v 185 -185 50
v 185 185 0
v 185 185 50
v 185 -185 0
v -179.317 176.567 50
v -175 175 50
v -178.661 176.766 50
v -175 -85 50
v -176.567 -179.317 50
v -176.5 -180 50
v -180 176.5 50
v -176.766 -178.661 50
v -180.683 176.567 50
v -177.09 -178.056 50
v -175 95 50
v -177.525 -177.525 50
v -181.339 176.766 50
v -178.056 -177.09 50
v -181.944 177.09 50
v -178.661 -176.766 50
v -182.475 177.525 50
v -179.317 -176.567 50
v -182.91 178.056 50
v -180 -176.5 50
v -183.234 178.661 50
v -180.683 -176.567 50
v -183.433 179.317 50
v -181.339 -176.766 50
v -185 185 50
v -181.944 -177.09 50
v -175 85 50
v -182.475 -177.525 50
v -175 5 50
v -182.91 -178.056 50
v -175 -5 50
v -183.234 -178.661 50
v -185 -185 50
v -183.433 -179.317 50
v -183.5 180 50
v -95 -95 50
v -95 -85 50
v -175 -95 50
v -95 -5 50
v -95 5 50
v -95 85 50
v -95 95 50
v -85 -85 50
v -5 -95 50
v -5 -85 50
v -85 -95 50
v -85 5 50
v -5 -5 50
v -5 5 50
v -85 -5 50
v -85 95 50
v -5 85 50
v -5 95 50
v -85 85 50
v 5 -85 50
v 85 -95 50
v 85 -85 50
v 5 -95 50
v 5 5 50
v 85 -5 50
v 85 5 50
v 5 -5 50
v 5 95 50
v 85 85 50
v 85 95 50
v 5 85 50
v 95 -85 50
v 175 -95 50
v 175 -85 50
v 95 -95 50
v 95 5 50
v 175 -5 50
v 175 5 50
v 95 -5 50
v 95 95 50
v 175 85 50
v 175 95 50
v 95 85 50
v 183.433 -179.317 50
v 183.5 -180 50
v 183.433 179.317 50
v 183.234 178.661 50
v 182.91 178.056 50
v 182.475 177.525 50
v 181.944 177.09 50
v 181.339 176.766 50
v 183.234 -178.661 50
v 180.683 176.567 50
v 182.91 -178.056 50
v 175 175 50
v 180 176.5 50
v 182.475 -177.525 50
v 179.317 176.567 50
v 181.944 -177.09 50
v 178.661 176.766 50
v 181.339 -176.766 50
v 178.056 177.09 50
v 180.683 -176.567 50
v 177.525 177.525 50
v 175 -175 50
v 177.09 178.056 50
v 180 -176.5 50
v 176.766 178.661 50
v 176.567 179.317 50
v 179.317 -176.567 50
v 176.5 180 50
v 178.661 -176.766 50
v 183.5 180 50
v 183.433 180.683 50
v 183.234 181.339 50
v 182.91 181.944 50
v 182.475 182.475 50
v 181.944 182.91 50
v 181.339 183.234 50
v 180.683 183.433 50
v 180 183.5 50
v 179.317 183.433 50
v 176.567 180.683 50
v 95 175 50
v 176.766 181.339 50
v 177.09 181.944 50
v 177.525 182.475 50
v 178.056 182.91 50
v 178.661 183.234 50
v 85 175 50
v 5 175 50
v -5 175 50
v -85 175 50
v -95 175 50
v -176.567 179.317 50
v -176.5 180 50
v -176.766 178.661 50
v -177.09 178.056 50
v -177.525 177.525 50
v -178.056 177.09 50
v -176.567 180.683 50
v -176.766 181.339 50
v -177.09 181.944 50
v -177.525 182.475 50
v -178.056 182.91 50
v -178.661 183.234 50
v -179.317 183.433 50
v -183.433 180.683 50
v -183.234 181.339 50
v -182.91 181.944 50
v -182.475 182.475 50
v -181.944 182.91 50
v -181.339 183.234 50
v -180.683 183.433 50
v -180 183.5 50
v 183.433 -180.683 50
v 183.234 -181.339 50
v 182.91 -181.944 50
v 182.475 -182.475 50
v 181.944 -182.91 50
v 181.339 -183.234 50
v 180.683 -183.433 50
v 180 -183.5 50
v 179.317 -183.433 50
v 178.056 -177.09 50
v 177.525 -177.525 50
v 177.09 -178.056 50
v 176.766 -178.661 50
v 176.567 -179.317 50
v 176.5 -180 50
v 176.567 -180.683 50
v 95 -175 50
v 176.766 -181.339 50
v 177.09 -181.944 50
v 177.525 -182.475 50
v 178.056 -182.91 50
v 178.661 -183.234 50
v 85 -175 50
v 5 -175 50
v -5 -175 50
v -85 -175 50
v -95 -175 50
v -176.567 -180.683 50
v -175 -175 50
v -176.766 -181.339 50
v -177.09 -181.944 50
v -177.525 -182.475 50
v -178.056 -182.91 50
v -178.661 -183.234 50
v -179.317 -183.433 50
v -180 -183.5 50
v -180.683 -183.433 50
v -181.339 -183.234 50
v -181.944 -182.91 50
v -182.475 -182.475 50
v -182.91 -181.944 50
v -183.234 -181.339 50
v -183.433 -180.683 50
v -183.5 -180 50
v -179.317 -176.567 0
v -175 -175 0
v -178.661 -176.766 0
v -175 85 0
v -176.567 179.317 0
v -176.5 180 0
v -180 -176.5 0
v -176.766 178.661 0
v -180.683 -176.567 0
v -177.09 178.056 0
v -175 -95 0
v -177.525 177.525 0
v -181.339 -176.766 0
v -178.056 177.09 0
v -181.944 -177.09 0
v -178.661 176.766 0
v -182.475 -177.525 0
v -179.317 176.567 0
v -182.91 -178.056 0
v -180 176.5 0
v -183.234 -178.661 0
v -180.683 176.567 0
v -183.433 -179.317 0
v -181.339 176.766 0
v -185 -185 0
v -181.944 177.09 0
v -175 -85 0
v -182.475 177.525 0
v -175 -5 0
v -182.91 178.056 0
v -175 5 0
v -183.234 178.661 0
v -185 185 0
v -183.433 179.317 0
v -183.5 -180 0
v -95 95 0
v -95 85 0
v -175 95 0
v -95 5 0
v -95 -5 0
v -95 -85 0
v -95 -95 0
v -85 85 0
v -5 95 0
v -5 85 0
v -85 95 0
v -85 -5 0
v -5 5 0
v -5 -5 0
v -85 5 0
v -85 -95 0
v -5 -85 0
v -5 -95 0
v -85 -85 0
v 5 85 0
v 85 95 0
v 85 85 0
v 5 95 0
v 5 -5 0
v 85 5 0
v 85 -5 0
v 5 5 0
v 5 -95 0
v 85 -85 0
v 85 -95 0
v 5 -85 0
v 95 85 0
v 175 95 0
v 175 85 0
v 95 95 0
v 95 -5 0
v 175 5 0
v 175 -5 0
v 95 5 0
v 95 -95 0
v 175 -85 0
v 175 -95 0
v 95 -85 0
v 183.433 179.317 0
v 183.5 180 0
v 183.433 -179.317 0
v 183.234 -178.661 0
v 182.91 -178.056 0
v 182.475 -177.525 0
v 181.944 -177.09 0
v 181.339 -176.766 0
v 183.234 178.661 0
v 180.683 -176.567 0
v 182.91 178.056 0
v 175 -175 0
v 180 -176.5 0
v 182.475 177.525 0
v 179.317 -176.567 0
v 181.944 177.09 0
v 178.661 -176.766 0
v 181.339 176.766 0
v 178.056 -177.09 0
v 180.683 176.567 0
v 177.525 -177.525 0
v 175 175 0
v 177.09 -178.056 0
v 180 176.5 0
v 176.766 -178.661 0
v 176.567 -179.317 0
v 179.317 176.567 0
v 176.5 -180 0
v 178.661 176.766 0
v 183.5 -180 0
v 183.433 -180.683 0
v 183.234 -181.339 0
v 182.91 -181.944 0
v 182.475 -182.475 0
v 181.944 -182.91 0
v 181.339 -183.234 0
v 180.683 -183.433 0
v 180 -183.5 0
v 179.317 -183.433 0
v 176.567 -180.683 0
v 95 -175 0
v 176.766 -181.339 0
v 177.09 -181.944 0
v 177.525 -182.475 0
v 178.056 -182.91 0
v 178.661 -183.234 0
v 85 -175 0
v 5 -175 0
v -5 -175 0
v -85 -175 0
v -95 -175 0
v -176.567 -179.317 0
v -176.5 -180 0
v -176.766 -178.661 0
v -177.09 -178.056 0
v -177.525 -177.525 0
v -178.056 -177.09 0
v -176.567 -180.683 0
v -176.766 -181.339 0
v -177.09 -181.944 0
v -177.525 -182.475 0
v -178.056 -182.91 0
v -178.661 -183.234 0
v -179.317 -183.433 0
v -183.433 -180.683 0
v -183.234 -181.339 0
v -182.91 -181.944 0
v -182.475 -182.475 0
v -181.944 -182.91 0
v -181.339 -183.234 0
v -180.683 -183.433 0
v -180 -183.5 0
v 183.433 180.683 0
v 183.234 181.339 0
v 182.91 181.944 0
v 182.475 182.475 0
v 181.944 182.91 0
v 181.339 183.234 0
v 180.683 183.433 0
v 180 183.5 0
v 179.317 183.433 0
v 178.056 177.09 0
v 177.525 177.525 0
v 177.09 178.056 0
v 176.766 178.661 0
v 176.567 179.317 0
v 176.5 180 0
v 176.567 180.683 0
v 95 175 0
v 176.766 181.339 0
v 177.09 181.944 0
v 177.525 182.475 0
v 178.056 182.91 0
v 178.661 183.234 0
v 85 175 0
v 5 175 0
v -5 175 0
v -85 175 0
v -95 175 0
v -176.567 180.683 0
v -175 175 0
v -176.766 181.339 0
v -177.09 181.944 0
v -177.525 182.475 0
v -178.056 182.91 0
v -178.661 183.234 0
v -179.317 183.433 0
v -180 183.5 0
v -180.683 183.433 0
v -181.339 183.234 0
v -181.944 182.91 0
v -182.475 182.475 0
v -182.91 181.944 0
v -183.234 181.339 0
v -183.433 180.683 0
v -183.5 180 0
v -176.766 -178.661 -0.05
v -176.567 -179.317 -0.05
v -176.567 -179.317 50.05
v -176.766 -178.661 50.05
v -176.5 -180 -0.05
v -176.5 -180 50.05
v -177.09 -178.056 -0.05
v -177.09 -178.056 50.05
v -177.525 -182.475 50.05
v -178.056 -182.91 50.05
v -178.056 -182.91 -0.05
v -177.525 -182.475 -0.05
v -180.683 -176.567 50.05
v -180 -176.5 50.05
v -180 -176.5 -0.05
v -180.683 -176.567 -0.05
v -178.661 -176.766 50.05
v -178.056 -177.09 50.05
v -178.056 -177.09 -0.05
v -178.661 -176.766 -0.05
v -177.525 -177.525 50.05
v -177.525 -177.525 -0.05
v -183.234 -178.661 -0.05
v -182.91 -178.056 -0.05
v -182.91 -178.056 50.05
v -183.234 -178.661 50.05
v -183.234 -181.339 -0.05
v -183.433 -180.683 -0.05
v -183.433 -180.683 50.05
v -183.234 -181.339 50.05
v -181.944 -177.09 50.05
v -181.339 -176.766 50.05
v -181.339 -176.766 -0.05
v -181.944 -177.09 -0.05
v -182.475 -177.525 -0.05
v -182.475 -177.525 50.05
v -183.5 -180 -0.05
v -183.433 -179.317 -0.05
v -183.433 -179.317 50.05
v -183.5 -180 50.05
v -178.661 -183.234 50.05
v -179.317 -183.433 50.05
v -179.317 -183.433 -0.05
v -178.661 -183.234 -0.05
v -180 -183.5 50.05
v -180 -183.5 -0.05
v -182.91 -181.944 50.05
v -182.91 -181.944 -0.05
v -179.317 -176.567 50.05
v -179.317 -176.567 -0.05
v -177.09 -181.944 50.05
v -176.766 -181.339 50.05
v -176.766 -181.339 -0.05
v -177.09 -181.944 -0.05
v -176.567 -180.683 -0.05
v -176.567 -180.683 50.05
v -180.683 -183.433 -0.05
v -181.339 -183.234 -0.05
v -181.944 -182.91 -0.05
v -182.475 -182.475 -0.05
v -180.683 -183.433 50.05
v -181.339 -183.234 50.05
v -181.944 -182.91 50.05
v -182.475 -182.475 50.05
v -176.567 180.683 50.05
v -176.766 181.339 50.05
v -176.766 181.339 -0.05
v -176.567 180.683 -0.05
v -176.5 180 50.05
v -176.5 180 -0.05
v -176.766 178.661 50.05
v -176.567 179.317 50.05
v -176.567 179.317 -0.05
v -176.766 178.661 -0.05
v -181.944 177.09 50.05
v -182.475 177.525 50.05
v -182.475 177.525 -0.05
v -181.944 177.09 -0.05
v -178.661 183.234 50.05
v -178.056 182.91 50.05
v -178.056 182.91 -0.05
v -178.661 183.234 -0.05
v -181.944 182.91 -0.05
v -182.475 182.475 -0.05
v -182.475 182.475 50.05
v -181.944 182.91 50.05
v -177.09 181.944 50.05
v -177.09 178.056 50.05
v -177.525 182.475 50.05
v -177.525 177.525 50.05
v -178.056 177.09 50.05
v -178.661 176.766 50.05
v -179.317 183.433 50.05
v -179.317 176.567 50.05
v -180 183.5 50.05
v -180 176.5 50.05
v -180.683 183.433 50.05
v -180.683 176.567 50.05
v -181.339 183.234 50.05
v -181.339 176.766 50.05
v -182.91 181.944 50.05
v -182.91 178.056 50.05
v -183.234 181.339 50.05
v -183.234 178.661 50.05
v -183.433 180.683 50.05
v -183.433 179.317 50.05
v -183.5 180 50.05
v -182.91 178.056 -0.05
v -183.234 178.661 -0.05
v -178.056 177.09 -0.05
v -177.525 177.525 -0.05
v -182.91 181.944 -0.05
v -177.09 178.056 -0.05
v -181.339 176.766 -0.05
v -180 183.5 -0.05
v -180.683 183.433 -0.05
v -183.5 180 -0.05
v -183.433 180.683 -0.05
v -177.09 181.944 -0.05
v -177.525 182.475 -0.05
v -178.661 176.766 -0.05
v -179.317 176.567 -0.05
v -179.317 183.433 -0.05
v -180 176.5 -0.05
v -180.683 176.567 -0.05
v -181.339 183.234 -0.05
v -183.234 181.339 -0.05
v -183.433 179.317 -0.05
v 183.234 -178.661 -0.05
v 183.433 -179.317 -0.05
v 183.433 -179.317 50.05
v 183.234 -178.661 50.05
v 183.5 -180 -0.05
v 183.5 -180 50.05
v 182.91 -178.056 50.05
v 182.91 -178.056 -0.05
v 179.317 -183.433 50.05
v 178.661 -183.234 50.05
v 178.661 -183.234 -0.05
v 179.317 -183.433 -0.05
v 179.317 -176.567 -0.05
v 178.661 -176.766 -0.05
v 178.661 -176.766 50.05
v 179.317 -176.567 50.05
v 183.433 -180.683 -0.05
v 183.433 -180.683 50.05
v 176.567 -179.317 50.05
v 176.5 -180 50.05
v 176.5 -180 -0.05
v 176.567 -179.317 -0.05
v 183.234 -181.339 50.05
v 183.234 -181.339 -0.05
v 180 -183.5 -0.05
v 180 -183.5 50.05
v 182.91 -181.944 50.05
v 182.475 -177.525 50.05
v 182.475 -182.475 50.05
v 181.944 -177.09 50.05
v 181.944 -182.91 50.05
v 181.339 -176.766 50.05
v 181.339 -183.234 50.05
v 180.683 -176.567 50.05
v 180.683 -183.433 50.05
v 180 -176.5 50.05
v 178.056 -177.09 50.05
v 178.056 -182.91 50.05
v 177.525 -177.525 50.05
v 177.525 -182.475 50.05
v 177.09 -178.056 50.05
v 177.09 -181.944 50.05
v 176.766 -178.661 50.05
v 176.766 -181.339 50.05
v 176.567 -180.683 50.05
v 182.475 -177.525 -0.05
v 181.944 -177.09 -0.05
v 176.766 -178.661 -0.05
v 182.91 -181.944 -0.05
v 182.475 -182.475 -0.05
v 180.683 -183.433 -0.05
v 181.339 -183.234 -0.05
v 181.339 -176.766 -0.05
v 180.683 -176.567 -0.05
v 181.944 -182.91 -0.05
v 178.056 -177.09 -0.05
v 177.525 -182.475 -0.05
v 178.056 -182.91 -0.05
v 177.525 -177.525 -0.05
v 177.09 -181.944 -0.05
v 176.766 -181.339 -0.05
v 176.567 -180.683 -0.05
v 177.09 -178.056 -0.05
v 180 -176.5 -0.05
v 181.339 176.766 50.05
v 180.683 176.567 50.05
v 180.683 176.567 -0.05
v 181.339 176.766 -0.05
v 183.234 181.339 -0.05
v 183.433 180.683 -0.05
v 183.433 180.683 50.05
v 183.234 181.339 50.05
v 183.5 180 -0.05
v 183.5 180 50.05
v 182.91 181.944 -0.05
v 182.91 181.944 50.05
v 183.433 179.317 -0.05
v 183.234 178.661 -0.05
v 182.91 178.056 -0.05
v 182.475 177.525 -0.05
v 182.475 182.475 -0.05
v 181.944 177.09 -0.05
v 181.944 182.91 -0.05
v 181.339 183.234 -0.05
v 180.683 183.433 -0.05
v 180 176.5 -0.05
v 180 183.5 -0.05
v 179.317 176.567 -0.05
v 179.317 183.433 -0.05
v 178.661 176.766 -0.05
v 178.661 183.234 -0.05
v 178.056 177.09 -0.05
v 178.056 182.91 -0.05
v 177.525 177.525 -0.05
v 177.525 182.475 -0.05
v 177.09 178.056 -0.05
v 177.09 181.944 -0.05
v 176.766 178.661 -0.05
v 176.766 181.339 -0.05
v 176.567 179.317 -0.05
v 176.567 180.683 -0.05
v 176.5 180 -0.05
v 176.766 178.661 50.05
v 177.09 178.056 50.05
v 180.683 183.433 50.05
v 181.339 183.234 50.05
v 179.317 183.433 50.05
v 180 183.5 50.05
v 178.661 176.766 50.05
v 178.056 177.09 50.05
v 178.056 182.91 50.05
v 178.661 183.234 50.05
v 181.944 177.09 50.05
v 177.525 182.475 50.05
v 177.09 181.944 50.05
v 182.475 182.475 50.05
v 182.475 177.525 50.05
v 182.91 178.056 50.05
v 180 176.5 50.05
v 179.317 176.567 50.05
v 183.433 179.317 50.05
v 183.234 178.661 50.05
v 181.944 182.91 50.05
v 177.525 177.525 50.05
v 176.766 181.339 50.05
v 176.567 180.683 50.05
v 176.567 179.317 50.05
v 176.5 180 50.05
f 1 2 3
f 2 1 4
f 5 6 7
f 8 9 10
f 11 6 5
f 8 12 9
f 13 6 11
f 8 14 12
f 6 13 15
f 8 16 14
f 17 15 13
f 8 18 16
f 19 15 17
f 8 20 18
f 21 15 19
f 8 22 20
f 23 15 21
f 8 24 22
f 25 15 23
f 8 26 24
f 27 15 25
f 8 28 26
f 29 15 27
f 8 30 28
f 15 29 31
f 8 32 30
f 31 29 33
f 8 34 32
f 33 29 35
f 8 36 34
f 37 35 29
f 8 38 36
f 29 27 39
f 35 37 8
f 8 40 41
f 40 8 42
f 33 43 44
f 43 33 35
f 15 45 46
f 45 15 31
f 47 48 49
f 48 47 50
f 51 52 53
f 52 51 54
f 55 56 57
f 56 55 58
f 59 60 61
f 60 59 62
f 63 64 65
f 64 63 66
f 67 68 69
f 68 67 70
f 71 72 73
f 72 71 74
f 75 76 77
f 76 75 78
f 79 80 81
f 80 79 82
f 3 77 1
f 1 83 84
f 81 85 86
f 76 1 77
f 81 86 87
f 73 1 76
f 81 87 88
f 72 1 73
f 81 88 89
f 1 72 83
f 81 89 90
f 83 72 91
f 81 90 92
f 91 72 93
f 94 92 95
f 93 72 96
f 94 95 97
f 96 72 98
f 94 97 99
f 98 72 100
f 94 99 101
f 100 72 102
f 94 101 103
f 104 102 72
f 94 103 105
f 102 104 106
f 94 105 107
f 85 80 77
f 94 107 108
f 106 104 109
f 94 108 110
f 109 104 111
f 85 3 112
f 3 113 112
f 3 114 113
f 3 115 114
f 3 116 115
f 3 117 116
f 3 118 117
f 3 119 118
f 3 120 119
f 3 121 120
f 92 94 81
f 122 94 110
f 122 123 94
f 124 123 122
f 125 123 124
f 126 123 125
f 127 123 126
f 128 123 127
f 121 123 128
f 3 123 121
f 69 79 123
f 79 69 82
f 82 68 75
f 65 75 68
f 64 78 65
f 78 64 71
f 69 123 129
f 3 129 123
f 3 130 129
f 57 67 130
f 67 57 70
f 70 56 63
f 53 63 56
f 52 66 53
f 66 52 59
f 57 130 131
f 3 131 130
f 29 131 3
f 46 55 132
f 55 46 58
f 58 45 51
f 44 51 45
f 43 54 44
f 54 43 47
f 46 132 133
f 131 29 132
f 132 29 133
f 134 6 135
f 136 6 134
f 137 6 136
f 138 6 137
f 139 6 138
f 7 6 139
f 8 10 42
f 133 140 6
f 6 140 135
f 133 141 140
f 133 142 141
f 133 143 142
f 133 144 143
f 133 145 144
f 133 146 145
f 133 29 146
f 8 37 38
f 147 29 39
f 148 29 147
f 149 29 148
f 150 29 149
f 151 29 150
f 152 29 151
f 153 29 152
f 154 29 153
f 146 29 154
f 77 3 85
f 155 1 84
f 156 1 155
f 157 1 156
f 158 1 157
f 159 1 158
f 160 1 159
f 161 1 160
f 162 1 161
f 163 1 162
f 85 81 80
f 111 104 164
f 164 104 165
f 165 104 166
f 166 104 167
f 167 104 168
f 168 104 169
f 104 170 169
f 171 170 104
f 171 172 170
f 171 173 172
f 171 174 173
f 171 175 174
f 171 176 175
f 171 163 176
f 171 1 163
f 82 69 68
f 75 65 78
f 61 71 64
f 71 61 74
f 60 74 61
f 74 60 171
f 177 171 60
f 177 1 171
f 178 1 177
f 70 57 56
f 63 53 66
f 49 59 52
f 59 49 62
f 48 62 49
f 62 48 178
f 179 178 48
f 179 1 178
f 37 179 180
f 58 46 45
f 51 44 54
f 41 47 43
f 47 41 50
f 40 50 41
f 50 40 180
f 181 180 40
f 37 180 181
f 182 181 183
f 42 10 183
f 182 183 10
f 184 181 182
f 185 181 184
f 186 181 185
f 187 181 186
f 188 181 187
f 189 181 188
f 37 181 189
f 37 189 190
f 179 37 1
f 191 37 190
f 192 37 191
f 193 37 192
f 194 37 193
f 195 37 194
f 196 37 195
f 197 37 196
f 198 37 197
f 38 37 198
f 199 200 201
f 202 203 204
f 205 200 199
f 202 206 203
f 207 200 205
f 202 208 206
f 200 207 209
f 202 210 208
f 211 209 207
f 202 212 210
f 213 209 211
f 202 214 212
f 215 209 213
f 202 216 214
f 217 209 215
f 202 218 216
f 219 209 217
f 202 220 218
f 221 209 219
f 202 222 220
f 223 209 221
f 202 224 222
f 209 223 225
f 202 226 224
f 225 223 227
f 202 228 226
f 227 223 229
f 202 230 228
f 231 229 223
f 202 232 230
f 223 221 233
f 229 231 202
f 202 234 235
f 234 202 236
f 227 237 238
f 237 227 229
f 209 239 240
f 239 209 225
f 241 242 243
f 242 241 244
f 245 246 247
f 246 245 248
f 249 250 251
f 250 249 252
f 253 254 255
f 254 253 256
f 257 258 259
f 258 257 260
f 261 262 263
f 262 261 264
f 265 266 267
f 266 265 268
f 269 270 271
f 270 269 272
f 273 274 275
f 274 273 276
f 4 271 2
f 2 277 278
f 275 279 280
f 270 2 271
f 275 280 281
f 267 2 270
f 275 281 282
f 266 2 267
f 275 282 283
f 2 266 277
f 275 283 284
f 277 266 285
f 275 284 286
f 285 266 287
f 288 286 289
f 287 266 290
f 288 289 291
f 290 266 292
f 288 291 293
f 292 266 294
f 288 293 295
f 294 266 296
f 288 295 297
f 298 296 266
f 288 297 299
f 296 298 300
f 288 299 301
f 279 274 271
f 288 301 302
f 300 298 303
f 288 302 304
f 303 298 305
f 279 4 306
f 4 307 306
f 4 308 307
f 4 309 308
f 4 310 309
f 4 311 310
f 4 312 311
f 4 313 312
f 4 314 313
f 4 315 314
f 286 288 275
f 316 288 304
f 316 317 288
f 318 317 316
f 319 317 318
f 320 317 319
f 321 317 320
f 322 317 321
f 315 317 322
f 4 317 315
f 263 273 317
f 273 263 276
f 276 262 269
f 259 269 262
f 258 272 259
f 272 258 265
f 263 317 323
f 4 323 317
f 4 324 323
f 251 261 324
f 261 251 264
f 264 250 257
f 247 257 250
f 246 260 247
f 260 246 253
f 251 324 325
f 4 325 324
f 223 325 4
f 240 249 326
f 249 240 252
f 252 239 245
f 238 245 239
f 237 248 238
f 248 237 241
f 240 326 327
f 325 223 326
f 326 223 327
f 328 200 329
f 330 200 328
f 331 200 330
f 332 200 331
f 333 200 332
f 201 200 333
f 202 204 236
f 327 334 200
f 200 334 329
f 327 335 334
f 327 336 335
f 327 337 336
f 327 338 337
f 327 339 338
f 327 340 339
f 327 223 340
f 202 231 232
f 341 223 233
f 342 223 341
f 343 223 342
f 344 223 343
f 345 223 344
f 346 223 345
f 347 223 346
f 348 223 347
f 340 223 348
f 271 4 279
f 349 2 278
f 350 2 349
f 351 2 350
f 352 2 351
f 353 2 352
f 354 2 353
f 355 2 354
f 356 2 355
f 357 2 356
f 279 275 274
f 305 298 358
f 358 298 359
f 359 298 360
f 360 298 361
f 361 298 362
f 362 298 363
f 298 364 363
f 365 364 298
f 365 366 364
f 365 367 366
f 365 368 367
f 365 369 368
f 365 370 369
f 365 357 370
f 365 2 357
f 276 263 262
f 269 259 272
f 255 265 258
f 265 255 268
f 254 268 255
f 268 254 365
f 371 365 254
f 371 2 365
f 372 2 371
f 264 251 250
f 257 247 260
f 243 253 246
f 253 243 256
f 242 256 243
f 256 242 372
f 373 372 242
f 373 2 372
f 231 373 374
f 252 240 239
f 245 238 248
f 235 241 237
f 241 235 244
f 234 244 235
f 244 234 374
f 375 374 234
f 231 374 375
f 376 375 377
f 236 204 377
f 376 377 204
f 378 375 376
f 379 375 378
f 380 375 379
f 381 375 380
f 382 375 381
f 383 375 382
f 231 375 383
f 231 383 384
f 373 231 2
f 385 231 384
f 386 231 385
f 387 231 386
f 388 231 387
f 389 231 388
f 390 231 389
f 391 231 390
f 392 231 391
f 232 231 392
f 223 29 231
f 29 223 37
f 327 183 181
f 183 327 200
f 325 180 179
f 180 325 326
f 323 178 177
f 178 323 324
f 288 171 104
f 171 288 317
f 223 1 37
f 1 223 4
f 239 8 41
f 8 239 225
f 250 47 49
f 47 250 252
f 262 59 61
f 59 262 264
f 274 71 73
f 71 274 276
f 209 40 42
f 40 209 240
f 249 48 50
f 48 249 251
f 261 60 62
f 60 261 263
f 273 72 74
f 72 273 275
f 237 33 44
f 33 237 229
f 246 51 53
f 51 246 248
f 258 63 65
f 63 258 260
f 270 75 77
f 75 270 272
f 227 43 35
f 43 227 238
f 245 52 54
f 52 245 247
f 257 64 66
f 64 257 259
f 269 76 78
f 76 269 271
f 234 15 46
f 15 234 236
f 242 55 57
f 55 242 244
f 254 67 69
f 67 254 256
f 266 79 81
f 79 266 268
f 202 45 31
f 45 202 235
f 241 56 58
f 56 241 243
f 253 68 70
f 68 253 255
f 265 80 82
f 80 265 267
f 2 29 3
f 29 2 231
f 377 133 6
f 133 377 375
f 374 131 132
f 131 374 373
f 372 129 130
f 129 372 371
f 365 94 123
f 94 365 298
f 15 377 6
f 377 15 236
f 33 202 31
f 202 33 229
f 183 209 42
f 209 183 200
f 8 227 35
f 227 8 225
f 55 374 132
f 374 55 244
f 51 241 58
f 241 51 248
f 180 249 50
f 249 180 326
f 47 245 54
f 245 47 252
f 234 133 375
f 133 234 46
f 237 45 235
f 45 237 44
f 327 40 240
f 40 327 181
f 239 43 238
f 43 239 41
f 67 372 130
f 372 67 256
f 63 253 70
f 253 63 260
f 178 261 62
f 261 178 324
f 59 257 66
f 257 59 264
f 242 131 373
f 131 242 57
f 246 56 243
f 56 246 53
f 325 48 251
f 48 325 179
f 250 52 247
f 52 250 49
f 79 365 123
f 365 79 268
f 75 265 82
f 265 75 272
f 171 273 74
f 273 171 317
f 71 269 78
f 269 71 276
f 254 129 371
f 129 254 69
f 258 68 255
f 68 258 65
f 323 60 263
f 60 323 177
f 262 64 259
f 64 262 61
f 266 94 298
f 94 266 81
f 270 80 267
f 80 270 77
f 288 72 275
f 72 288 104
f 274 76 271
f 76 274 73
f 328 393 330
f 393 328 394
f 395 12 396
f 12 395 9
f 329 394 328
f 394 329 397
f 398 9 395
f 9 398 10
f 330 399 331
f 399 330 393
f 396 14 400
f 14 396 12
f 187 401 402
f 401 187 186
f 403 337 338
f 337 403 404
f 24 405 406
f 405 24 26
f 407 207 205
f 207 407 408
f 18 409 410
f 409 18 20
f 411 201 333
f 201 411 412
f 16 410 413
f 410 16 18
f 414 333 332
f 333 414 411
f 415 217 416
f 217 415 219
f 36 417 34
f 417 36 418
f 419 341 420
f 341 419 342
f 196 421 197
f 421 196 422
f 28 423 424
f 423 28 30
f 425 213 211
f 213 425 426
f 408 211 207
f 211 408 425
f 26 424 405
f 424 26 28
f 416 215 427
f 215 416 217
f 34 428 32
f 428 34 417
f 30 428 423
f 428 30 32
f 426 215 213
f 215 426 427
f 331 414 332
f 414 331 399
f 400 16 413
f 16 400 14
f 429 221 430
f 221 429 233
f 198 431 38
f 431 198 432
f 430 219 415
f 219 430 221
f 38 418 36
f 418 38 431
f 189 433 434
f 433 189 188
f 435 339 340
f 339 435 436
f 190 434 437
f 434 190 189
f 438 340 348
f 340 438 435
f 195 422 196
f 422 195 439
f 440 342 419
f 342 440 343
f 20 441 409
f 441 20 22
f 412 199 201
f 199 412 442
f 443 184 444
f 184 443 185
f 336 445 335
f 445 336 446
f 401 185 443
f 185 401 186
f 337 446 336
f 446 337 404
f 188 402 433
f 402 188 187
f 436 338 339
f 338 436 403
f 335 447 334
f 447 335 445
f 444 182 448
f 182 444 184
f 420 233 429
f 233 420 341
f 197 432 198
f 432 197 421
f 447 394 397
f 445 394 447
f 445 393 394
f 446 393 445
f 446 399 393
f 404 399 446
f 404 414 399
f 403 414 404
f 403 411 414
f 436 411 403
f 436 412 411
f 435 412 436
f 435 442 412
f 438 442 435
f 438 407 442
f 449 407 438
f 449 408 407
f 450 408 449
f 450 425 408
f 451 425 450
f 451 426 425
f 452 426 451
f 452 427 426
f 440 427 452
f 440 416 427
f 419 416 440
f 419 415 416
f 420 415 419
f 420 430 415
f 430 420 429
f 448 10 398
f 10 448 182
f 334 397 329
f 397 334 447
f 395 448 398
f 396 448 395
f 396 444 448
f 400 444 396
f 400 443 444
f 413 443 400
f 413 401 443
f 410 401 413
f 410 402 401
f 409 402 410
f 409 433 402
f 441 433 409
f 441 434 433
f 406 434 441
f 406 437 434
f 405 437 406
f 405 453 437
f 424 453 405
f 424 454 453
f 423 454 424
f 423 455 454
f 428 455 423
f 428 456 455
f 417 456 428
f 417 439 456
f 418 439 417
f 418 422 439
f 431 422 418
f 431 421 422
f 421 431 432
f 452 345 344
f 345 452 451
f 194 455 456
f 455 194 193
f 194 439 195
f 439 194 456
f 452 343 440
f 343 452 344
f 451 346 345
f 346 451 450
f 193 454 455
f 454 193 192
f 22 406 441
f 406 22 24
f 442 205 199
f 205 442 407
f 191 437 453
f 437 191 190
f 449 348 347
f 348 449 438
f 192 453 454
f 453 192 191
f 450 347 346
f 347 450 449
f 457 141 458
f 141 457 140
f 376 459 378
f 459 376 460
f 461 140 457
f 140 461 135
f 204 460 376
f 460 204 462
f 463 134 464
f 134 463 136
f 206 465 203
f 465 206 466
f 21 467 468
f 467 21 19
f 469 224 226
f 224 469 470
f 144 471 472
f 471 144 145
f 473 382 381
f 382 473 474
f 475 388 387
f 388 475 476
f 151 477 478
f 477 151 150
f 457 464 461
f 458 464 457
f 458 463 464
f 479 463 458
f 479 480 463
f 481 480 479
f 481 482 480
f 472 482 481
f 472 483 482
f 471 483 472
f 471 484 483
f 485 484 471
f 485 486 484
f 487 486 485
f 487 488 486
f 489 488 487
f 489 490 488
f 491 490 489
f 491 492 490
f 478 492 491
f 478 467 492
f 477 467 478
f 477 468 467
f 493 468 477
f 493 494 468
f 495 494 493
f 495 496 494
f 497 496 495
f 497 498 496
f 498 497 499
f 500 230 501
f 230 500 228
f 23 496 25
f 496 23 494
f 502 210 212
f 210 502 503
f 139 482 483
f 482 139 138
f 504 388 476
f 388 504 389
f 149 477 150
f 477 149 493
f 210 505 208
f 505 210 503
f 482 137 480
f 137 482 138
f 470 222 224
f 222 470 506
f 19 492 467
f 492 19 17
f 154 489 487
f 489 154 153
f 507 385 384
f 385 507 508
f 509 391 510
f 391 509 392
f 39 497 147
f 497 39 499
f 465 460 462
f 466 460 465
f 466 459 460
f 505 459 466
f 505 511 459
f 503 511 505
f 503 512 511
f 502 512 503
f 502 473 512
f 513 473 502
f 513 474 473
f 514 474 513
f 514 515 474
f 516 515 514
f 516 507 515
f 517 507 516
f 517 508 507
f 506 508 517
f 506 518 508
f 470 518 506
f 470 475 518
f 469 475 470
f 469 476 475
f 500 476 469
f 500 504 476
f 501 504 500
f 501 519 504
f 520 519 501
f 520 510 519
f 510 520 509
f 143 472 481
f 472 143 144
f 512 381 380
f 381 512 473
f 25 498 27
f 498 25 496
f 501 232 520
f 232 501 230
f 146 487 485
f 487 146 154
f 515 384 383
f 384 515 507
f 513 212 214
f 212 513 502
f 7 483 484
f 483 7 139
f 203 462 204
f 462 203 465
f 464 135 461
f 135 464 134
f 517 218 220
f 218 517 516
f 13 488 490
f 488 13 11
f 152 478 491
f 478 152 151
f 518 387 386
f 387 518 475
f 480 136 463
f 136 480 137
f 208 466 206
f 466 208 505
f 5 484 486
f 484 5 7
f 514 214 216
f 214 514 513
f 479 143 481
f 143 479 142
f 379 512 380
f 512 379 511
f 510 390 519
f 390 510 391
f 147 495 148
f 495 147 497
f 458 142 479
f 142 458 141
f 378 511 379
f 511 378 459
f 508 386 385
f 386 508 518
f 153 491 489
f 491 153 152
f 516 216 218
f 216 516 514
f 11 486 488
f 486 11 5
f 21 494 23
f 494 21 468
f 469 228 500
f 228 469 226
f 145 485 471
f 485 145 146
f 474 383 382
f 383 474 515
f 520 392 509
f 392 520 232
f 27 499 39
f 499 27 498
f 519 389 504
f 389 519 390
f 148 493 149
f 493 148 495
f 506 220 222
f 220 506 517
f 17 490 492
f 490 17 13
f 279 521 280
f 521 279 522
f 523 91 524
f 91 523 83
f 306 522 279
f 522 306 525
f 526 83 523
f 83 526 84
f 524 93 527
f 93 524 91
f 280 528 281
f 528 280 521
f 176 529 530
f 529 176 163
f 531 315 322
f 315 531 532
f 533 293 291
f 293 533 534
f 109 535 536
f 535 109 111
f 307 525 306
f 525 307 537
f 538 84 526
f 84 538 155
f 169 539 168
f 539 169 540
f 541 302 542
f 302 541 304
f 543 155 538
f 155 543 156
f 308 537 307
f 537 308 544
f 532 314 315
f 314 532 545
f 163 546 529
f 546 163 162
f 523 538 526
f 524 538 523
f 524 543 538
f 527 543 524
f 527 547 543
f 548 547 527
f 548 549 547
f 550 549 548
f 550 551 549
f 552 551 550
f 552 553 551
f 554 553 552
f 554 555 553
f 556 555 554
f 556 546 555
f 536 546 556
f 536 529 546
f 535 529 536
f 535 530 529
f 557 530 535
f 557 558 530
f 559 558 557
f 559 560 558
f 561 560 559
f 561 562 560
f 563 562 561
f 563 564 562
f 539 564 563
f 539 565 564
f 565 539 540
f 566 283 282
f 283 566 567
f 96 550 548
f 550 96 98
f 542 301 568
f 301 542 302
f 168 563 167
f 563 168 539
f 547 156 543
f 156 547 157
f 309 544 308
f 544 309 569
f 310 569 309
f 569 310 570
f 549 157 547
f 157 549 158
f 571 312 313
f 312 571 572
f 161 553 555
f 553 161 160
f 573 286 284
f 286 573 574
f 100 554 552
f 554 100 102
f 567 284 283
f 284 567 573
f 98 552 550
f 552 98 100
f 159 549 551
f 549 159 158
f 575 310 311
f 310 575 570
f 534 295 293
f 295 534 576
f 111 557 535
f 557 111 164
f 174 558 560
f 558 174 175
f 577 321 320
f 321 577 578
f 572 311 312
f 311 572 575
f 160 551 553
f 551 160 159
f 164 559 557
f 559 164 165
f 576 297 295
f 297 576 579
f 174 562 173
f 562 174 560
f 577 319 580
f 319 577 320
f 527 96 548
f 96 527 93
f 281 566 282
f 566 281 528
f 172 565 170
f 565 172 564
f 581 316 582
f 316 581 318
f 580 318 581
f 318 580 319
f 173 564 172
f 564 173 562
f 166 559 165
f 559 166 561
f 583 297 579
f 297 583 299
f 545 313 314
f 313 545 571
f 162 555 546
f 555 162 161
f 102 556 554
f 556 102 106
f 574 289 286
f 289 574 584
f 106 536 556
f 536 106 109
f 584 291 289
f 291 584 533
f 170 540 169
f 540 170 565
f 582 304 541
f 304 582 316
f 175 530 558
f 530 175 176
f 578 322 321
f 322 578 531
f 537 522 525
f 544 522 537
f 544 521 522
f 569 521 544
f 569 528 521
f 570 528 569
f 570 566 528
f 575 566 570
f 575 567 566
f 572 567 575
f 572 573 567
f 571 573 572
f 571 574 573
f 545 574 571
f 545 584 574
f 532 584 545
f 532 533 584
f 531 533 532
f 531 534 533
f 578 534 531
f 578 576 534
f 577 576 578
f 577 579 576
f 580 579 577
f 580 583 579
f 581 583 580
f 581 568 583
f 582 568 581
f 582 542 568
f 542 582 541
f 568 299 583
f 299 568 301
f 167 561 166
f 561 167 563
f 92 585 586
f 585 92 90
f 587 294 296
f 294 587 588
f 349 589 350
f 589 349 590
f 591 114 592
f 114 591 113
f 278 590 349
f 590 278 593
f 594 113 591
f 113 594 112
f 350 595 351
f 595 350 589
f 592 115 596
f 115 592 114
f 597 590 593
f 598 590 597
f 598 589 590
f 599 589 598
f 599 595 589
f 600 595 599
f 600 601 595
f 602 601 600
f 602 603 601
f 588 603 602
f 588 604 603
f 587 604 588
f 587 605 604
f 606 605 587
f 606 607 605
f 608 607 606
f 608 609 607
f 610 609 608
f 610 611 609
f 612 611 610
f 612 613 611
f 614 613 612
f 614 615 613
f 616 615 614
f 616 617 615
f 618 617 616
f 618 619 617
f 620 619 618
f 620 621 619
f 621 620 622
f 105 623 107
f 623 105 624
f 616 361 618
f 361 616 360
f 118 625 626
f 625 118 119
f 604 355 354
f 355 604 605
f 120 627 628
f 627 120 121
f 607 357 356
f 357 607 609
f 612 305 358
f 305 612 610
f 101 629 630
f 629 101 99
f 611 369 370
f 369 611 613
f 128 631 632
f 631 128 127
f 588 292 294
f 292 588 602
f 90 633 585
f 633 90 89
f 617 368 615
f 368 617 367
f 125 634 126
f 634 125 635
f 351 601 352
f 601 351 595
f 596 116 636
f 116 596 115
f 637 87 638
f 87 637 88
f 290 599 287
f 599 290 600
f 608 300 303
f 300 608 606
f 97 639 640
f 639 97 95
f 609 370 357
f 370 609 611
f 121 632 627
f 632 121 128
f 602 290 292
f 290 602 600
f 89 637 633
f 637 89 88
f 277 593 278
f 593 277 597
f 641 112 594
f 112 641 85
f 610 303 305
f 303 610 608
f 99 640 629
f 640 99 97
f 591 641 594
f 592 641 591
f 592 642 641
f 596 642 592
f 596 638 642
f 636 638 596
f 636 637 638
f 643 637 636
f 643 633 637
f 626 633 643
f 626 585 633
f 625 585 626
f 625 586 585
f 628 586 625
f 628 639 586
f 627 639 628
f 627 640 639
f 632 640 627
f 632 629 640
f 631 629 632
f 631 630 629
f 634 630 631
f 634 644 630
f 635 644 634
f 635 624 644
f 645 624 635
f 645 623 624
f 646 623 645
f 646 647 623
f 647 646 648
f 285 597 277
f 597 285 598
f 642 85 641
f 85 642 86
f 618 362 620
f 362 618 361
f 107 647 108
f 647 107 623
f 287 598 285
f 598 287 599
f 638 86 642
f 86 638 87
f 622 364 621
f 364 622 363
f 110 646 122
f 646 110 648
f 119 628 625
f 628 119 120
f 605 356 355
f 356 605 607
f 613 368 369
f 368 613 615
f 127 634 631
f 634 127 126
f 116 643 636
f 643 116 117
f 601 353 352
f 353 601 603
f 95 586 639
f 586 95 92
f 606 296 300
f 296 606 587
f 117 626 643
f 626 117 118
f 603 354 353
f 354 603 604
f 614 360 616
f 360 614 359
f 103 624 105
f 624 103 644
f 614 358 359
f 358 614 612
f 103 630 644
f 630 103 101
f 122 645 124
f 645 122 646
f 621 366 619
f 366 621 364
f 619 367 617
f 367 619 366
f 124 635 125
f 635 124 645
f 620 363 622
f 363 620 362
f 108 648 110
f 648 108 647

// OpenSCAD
// Part Name: Cage_Layer_7_H50mm
// This part represents a horizontal slice of the cage.
// It is designed to be 3D printed on its base.

// Parameters for the cage
bar_t = 10;
gap_xy = 80;
hole_d = 7;
cage_ext_xy = 370;

// Calculate bar center positions relative to the overall cage center
bar_centers_xy = [for (j = [0:4]) (-cage_ext_xy/2 + bar_t/2 + j * (bar_t + gap_xy))];

// Module to generate a single layer segment
module cage_layer_segment(height) {
    // Offset for printing on z=0 plane. The module itself is centered on XY=0, so this Z offset moves its base to Z=0.
    translate([0, 0, height/2]) {
        union() {
            // Horizontal bars (along X)
            for (y_center = bar_centers_xy) {
                translate([0, y_center, 0])
                cube([cage_ext_xy, bar_t, height], center = true);
            }

            // Vertical bars (along Y)
            for (x_center = bar_centers_xy) {
                translate([x_center, 0, 0])
                cube([bar_t, cage_ext_xy, height], center = true);
            }

            // Subtract holes for M6 rods at the 4 corners
            corner_offsets_xy = [bar_centers_xy[0], bar_centers_xy[4]];

            for (x_offset = corner_offsets_xy) {
                for (y_offset = corner_offsets_xy) {
                    // Hole through the center of the corner bar
                    translate([x_offset, y_offset, 0])
                    cylinder(h = height + 0.1, d = hole_d, center = true, $fn=32); // +0.1 for clean cut
                }
            }
        }
    }
}

// Render the segment
cage_layer_segment(50);
